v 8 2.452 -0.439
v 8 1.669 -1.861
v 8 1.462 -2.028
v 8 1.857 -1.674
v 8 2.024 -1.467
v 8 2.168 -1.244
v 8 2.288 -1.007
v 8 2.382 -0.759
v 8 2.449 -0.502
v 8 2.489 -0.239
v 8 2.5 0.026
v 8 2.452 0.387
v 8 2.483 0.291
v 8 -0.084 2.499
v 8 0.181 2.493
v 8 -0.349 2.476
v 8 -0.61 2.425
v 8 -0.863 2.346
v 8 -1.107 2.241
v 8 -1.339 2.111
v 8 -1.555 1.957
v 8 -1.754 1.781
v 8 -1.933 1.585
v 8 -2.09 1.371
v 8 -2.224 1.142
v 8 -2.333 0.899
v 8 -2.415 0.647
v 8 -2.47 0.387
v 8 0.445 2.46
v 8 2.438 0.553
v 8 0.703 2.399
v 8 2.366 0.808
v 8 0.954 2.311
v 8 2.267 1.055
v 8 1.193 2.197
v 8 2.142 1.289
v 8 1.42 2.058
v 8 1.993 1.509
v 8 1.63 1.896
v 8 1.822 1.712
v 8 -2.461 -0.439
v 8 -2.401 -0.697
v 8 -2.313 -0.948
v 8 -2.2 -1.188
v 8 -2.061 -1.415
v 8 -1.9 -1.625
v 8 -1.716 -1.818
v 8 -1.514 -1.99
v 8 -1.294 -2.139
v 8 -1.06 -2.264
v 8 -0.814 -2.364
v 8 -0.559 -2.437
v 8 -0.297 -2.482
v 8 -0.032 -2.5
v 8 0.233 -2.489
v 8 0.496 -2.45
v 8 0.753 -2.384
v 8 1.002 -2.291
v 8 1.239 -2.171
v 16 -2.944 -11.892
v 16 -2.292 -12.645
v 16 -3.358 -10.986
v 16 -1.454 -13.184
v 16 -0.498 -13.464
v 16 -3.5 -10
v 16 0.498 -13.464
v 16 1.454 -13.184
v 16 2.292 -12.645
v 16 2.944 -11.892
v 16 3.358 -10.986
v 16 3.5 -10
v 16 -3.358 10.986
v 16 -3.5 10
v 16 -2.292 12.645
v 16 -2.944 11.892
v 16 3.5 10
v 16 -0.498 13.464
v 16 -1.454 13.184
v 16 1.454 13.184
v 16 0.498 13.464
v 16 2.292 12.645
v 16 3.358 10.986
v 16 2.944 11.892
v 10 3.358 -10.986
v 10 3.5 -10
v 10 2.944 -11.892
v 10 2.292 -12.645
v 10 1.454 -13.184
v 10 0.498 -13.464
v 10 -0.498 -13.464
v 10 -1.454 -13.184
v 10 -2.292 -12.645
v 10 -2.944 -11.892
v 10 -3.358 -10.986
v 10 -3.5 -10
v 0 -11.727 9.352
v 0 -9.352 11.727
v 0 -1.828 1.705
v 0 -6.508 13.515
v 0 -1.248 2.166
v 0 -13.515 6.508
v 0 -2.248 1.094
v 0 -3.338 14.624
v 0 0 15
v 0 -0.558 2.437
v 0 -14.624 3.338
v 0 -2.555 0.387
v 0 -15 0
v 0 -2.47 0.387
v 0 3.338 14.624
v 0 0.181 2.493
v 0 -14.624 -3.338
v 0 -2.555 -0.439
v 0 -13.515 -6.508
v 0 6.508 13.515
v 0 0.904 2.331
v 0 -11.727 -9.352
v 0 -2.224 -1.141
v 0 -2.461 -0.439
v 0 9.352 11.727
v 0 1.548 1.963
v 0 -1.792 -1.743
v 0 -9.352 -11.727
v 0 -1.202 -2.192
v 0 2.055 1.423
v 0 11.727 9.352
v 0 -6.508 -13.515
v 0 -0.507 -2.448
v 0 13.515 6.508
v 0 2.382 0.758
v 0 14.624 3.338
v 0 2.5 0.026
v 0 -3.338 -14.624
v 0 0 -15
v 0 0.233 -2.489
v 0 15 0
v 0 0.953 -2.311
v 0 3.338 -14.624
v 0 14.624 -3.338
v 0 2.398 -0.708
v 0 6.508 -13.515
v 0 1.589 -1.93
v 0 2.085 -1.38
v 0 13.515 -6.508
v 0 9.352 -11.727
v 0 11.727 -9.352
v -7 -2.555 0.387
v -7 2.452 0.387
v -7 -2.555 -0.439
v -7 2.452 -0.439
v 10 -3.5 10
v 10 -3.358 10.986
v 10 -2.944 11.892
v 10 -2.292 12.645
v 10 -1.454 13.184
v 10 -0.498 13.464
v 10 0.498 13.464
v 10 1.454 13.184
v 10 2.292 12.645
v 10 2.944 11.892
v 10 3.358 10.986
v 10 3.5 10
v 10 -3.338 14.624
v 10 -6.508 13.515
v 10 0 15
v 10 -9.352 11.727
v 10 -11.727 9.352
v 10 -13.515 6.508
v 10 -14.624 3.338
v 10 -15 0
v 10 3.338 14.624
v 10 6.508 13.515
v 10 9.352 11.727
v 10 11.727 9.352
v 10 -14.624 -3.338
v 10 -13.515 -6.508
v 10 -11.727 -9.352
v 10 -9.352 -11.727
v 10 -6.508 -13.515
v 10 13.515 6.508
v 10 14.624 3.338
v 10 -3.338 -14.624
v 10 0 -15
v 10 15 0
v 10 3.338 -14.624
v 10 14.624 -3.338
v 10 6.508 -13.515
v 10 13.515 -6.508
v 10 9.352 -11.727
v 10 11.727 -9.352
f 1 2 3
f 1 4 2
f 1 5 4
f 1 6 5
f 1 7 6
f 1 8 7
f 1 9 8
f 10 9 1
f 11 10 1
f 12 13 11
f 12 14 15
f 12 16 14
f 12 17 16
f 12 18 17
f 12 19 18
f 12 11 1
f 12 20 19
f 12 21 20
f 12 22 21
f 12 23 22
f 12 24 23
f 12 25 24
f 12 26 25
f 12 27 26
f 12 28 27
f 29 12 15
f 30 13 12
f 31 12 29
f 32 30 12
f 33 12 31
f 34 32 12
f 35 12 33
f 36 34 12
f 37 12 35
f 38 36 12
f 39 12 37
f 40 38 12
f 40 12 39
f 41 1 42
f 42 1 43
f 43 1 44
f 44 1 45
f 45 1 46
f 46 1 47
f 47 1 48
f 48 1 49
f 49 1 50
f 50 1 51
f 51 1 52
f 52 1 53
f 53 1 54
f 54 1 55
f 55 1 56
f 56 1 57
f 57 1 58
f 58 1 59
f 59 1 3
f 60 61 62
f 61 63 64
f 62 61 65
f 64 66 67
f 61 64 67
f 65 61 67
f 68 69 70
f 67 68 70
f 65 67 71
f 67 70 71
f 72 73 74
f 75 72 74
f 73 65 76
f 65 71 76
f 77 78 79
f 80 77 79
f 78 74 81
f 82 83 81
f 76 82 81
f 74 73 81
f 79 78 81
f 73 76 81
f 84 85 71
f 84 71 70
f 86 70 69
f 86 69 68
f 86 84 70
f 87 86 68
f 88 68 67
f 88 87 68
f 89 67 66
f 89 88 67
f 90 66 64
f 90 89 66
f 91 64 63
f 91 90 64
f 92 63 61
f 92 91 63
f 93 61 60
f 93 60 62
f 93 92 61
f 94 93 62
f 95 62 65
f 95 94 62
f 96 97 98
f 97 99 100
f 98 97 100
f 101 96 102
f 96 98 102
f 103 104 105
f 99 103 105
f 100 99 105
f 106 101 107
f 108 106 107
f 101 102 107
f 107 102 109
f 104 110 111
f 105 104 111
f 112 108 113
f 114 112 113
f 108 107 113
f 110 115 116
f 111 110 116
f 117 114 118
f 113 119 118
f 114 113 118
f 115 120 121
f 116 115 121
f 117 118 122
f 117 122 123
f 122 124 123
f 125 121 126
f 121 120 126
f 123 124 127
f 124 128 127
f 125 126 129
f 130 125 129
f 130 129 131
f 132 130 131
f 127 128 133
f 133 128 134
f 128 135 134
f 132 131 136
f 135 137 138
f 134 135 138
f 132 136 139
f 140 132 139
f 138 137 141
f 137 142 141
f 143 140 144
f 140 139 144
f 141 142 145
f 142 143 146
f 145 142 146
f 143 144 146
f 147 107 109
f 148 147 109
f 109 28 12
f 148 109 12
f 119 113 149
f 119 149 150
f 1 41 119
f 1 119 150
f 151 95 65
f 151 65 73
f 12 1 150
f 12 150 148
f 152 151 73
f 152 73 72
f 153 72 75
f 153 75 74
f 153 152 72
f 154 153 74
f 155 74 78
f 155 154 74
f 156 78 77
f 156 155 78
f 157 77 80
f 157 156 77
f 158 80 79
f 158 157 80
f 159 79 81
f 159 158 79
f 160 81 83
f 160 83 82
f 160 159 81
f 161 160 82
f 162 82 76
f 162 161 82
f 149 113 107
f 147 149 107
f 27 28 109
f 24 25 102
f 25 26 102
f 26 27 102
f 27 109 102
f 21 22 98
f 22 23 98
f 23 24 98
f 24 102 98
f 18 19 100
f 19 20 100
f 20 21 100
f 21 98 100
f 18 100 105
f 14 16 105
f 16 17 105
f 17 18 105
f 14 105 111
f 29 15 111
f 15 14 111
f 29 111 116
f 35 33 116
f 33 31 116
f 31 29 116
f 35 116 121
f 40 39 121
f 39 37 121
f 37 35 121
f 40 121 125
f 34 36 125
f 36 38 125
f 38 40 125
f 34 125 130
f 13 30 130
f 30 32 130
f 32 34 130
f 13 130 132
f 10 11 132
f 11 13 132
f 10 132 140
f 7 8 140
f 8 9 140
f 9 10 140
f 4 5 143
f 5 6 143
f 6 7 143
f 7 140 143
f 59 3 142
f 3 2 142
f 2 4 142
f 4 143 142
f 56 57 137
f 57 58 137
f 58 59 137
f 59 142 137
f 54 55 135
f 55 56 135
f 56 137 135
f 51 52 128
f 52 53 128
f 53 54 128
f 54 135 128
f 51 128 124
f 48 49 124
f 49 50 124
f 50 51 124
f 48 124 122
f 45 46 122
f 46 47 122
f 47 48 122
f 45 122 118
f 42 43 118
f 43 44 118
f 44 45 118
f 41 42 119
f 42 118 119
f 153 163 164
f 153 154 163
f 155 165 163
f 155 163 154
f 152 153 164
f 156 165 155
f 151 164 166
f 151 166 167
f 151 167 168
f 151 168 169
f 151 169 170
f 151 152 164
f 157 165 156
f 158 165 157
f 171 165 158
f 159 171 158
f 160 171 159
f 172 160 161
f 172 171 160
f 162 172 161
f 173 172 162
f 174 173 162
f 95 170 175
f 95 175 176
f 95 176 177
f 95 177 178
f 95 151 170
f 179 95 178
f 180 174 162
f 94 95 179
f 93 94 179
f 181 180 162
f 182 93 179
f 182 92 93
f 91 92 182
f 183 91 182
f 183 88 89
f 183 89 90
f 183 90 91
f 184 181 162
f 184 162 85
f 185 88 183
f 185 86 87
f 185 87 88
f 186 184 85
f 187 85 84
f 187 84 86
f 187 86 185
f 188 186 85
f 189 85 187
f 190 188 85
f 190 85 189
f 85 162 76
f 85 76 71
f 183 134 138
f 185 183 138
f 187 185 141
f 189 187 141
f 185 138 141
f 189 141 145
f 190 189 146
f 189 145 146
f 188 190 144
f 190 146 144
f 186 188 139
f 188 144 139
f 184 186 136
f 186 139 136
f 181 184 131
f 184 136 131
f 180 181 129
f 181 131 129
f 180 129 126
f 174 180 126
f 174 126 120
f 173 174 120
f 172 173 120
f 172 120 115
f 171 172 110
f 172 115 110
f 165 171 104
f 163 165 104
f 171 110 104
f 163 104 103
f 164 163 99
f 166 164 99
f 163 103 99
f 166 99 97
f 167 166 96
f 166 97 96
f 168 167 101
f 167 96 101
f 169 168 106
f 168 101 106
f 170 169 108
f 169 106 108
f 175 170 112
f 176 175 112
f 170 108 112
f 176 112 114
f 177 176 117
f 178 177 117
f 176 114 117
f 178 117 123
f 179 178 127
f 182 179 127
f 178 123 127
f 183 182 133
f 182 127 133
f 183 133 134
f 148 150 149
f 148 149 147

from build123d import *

# Parameters (mm, degrees)
SKETCH2_R           = 15
BOSS_EXTRUDE1_DEPTH = 10
BOSS_EXTRUDE2_DEPTH = 6
SKETCH4_R           = 2.5
CUT_EXTRUDE1_DEPTH  = 8
SKETCH6_W           = 0.825946649
SKETCH6_H           = 5.007301559
BOSS_EXTRUDE3_DEPTH = 15


with BuildPart() as part:
    # Sketch2 → Boss-Extrude1 (new body)
    with BuildSketch(Plane(origin=(0, 0, 0), x_dir=(0, 0, -1), z_dir=(1, 0, 0))):
        Circle(SKETCH2_R)
    extrude(amount=BOSS_EXTRUDE1_DEPTH)

    # Sketch3 → Boss-Extrude2 (add)
    with BuildSketch(Plane(origin=(10, 0, 0), x_dir=(0, 0, -1), z_dir=(1, 0, 0))):
        with BuildLine():
            Line((-10, 3.5), (10, 3.5))
            ThreePointArc((10, 3.5), (13.5, 0), (10, -3.5))
            Line((10, -3.5), (-10, -3.5))
            ThreePointArc((-10, -3.5), (-13.5, 0), (-10, 3.5))
        make_face()
    extrude(amount=BOSS_EXTRUDE2_DEPTH)

    # Sketch4 → Cut-Extrude1 (cut)
    with BuildSketch(Plane.ZY):
        Circle(SKETCH4_R)
    extrude(amount=-CUT_EXTRUDE1_DEPTH, mode=Mode.SUBTRACT)

    # Sketch6 → Boss-Extrude3 (add)
    with BuildSketch(Plane.ZY.offset(-8)):
        with Locations((-0.025810832, -0.051621665)):
            Rectangle(SKETCH6_W, SKETCH6_H)
    extrude(amount=BOSS_EXTRUDE3_DEPTH)


solid = part.part
